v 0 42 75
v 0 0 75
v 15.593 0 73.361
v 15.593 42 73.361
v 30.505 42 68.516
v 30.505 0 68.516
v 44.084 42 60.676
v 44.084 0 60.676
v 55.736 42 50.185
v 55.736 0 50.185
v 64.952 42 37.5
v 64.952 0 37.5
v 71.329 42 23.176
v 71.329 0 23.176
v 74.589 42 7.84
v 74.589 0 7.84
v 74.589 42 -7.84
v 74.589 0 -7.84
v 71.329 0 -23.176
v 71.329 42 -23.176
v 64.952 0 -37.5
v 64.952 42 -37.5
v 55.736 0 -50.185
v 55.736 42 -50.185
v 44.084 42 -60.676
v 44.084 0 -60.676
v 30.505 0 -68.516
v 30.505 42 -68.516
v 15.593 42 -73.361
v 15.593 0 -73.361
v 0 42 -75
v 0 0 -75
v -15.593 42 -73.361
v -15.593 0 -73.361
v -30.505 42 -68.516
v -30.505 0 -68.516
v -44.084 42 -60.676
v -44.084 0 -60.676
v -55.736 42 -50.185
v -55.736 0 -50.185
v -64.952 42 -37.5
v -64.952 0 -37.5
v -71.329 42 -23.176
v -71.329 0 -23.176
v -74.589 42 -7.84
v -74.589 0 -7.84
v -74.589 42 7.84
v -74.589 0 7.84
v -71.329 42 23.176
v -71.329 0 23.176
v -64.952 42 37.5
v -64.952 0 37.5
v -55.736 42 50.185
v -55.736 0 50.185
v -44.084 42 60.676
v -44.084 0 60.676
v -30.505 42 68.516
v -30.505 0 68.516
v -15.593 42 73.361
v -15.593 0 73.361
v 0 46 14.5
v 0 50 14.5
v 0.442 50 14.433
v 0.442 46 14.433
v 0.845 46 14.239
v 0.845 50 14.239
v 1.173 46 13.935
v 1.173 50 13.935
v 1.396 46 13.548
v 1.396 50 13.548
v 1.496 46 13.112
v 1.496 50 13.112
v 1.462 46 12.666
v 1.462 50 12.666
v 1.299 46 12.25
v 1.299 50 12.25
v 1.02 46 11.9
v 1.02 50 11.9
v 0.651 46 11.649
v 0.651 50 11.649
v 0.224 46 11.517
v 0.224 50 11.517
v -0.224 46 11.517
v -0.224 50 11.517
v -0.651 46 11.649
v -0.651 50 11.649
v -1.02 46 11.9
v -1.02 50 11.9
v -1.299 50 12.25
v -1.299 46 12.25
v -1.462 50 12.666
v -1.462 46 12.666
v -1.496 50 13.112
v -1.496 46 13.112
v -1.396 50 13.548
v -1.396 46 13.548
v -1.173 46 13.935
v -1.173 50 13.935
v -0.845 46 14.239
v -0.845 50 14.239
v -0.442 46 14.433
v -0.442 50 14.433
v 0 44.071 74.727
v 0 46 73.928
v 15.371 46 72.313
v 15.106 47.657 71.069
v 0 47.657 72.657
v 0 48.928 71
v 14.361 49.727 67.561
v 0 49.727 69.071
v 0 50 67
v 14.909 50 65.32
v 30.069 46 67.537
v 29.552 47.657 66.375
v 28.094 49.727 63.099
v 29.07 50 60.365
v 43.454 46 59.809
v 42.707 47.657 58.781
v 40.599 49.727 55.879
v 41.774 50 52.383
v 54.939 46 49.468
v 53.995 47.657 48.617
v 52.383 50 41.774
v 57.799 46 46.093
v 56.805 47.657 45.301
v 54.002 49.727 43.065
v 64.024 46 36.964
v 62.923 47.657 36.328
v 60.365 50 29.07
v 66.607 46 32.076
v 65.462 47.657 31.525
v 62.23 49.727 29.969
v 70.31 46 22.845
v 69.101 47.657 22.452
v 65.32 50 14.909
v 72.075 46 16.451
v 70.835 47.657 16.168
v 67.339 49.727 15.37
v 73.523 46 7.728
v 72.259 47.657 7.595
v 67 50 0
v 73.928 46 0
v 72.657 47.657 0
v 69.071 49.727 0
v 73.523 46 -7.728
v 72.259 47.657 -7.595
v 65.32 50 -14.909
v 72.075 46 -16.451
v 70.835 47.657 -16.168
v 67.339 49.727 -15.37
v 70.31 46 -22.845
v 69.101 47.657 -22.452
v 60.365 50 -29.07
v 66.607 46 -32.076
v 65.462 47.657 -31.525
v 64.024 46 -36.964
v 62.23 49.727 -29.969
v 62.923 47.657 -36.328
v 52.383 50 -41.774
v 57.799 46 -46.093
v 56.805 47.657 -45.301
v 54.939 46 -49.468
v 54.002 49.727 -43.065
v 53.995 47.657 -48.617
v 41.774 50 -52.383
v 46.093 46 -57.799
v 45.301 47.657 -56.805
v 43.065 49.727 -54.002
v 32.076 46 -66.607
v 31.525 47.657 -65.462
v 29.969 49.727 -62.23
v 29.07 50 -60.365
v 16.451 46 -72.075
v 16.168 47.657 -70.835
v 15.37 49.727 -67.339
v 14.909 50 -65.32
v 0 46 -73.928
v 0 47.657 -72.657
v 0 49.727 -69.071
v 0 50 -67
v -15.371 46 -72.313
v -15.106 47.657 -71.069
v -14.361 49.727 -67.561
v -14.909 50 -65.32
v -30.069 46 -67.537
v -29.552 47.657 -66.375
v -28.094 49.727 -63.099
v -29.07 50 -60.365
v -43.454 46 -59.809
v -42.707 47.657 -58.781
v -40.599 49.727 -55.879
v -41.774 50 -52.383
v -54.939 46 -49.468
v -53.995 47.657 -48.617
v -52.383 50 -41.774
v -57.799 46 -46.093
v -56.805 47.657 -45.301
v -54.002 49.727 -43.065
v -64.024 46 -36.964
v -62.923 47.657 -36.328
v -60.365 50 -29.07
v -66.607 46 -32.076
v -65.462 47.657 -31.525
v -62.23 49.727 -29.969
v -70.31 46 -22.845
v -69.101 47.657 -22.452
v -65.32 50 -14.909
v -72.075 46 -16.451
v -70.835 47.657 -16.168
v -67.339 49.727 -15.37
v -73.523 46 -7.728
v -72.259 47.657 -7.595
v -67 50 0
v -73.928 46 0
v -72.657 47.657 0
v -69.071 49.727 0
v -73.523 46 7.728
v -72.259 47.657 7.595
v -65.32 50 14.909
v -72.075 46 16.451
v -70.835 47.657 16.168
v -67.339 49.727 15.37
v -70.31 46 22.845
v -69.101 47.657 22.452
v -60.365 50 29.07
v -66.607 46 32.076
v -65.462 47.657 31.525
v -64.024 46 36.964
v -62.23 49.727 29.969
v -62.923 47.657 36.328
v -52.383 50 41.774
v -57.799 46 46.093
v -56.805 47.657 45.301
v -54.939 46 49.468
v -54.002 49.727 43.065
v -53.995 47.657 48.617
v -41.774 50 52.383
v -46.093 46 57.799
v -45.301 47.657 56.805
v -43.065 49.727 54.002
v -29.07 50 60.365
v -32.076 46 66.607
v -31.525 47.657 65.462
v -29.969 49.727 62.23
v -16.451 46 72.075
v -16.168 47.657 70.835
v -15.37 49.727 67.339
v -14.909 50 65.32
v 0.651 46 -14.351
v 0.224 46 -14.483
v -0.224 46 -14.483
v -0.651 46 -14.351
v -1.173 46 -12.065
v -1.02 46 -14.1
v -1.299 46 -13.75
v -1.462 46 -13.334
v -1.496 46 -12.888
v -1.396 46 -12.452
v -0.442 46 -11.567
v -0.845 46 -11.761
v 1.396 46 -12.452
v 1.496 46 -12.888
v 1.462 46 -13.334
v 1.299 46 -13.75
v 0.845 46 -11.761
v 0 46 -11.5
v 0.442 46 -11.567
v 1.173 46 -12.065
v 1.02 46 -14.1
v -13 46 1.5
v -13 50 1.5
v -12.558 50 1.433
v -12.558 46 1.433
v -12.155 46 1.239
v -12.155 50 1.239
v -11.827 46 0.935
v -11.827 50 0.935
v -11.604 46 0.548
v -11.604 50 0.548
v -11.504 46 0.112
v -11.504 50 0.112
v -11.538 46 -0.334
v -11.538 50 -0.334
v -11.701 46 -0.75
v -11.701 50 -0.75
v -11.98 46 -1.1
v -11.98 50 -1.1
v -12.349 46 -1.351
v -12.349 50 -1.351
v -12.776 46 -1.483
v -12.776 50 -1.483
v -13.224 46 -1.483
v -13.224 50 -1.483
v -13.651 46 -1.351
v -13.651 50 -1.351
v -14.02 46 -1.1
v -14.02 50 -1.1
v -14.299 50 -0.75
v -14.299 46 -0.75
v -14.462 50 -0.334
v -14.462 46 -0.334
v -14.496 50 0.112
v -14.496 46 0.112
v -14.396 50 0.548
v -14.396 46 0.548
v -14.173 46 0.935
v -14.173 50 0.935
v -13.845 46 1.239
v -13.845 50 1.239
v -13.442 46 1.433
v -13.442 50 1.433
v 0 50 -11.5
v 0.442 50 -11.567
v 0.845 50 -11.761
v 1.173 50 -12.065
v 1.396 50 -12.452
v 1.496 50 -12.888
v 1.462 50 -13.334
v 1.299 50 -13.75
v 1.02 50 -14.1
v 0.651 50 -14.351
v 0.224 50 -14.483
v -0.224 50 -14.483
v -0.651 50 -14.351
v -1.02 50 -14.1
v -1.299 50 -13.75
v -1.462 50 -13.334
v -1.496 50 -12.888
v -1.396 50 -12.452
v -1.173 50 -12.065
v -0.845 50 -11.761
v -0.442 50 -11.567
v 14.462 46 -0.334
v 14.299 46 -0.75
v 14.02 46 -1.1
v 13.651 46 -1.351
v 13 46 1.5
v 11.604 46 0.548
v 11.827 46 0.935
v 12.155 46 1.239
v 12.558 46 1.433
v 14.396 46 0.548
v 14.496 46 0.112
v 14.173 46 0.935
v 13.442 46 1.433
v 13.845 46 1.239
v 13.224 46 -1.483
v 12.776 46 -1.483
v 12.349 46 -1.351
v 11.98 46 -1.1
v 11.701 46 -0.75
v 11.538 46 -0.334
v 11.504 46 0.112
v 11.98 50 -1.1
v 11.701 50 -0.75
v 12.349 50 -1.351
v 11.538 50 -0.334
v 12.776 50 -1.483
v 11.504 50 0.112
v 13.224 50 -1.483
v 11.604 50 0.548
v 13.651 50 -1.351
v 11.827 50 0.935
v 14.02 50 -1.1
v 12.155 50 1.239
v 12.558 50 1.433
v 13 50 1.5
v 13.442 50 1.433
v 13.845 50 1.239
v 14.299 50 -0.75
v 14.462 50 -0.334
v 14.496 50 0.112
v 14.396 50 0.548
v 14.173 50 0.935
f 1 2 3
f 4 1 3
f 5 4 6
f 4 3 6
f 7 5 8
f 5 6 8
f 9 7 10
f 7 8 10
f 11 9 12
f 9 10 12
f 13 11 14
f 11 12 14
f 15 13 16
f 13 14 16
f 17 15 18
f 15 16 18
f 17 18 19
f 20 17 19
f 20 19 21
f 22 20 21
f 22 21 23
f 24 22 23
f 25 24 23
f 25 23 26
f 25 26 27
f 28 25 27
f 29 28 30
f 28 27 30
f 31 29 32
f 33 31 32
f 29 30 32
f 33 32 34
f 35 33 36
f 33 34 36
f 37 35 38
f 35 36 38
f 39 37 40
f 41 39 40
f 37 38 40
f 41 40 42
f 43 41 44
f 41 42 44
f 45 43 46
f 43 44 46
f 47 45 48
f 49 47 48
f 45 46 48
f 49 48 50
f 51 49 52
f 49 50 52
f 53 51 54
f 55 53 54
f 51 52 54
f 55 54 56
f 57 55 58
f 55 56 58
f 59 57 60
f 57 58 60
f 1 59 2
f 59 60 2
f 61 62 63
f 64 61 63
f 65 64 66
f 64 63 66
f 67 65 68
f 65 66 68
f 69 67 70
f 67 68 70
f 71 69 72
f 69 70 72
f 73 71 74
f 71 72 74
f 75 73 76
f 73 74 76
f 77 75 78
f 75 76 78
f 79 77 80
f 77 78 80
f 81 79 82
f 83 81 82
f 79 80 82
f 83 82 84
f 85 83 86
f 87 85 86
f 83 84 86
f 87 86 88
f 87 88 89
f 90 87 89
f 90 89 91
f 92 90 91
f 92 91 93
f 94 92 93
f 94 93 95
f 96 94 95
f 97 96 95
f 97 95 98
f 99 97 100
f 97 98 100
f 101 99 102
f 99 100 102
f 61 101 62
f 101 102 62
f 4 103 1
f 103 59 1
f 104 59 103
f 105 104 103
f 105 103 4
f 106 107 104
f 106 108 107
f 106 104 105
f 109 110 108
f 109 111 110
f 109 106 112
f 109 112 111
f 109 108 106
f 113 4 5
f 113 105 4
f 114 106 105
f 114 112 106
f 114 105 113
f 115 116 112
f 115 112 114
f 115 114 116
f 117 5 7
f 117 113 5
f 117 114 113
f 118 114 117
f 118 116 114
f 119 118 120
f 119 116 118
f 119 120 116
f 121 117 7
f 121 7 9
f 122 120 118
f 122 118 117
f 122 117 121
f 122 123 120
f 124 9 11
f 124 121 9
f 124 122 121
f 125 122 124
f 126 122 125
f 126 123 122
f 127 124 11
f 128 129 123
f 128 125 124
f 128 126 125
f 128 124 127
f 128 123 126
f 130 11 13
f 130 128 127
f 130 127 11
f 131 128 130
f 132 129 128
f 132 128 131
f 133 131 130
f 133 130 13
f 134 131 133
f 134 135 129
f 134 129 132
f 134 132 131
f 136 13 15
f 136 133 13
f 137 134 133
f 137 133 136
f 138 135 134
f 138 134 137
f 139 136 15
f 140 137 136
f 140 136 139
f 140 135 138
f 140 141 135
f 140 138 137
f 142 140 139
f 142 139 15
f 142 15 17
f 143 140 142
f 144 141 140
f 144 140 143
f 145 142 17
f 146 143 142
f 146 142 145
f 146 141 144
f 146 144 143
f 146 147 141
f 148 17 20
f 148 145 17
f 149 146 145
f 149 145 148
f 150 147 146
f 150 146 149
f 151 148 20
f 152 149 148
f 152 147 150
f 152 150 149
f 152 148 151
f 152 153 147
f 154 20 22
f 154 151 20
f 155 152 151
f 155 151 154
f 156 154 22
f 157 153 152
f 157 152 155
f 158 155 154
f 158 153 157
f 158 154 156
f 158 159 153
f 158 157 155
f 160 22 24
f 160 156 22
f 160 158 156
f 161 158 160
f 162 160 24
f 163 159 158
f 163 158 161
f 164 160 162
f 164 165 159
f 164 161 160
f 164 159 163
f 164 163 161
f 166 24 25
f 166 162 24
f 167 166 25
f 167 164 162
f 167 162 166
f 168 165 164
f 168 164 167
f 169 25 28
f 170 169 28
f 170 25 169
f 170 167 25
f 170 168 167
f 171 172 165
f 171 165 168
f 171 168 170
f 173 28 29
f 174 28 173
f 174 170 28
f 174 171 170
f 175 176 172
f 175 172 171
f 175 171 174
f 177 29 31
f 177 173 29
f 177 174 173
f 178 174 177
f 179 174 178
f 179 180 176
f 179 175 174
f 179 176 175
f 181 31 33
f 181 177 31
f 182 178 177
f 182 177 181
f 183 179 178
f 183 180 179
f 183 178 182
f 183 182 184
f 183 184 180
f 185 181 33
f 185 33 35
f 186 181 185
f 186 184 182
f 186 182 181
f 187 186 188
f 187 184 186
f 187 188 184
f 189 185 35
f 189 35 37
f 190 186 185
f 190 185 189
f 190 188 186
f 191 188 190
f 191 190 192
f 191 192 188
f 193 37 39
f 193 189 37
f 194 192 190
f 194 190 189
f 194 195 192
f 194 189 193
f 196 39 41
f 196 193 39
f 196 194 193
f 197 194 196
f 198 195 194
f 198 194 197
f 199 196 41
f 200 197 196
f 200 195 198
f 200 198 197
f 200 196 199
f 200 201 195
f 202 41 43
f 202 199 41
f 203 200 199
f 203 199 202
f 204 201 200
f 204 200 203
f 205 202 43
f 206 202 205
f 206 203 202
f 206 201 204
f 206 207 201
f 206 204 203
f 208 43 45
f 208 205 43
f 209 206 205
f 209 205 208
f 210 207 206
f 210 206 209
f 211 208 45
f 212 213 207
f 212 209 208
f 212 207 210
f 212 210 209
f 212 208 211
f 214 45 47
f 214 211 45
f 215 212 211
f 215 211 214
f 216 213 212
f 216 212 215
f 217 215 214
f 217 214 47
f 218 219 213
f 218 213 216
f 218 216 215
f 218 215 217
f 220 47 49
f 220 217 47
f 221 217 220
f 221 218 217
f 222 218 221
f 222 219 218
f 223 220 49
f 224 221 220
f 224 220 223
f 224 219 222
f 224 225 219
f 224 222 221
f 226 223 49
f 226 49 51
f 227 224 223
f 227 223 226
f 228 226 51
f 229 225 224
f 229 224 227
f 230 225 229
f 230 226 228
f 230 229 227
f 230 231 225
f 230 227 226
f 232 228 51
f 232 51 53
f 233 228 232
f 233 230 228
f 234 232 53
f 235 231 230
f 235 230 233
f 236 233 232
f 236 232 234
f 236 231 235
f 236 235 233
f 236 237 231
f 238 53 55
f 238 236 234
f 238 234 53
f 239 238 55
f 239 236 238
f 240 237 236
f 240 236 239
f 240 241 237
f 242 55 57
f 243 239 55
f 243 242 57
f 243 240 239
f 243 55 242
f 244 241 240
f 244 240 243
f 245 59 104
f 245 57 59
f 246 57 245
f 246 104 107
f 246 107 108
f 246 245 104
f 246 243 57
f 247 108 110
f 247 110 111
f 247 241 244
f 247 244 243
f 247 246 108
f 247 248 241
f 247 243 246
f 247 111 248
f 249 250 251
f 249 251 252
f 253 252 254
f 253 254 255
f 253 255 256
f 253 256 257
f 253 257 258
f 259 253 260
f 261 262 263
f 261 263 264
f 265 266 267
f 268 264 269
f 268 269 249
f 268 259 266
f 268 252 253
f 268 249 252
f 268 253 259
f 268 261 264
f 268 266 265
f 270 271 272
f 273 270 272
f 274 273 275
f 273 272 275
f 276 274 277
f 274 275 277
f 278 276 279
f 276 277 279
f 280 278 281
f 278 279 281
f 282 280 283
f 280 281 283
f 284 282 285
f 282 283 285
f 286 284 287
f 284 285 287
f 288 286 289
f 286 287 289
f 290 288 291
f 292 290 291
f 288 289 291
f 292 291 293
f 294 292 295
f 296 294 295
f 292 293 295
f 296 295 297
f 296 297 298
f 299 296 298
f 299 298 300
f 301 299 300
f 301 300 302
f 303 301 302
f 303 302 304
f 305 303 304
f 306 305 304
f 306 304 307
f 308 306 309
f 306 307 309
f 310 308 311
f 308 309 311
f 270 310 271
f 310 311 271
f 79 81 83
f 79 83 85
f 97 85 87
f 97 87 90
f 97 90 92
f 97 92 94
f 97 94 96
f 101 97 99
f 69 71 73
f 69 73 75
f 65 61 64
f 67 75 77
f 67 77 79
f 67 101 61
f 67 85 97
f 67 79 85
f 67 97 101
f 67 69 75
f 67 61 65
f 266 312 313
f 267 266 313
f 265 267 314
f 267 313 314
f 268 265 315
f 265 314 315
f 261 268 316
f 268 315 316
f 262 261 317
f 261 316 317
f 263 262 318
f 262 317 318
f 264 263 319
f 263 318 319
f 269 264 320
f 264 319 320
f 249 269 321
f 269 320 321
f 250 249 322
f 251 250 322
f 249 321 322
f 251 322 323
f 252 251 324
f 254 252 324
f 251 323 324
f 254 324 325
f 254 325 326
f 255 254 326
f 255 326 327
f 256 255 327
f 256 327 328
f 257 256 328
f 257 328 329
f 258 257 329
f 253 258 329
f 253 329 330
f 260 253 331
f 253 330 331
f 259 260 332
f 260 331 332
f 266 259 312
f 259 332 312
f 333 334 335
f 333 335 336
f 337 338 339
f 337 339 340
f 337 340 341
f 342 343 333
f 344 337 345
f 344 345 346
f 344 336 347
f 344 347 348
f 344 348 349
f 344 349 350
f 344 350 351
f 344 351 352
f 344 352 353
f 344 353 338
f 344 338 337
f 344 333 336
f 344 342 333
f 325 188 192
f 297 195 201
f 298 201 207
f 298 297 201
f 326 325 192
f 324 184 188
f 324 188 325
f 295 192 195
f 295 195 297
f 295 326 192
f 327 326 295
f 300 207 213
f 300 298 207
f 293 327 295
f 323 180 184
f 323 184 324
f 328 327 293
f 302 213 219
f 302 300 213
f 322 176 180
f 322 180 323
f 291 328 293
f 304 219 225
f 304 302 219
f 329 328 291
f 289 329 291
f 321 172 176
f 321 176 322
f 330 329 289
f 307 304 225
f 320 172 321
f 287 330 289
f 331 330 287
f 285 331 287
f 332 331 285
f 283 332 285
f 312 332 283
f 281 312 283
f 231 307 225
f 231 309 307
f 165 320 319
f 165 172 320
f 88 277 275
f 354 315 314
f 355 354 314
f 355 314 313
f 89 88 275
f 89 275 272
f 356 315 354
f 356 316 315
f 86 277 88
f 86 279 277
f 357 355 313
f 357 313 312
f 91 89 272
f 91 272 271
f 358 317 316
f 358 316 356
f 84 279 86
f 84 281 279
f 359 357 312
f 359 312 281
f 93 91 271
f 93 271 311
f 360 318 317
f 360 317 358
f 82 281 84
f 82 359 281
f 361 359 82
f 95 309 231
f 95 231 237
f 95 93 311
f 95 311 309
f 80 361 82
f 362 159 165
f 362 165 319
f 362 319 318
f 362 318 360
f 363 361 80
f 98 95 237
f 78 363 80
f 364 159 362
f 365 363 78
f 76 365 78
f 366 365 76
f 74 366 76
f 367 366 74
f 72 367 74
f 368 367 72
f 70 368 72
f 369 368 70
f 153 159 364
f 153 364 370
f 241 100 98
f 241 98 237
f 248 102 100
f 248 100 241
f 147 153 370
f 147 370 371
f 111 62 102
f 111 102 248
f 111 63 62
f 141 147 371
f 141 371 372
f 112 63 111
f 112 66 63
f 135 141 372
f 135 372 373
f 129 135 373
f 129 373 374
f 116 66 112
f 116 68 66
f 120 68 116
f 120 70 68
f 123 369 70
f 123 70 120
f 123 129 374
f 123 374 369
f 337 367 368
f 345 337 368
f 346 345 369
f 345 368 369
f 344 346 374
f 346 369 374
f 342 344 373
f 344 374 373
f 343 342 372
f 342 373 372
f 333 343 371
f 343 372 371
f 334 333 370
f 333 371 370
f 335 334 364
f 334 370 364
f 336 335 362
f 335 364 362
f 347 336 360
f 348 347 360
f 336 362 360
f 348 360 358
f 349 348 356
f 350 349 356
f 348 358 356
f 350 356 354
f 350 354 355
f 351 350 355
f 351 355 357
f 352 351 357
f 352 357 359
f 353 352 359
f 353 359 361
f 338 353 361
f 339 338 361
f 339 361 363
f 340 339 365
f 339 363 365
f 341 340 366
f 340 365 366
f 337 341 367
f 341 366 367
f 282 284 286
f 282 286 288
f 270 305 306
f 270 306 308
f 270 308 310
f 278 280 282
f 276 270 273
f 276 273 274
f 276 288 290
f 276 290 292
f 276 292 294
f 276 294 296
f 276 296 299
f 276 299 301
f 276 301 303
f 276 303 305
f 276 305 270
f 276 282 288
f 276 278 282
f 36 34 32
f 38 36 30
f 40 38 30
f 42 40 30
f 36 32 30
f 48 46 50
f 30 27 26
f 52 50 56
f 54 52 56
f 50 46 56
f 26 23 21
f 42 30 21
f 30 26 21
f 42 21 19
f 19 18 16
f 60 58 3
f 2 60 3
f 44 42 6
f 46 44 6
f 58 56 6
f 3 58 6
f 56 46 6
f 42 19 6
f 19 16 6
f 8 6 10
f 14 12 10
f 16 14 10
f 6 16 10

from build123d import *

# Parameters (mm, degrees)
SKETCH1_R           = 75
BOSS_EXTRUDE1_DEPTH = 50
FILLET1_R           = 8
SKETCH2_R           = 1.5
CUT_EXTRUDE1_DEPTH  = 4


with BuildPart() as part:
    # Sketch1 → Boss-Extrude1 (new body)
    with BuildSketch(Plane(origin=(0, 0, 0), x_dir=(1, 0, 0), z_dir=(0, 1, 0))):
        with Locations(Location((0, 0, 0), (0, 0, 270))):
            Circle(SKETCH1_R)
    extrude(amount=BOSS_EXTRUDE1_DEPTH)

    # Fillet1
    fillet1_edges = [part.edges().sort_by_distance(p)[0] for p in [
        (0, 50, -75),
    ]]
    fillet(fillet1_edges, radius=FILLET1_R)

    # Sketch2 → Cut-Extrude1 (cut)
    with BuildSketch(Plane(origin=(0, 50, 0), x_dir=(1, 0, 0), z_dir=(0, 1, 0))):
        with Locations(Location((0, 13, 0), (0, 0, 270))):
            Circle(SKETCH2_R)
        with Locations(Location((13, 0, 0), (0, 0, 270))):
            Circle(SKETCH2_R)
        with Locations(Location((0, -13, 0), (0, 0, 270))):
            Circle(SKETCH2_R)
        with Locations(Location((-13, 0, 0), (0, 0, 270))):
            Circle(SKETCH2_R)
    extrude(amount=-CUT_EXTRUDE1_DEPTH, mode=Mode.SUBTRACT)


solid = part.part
